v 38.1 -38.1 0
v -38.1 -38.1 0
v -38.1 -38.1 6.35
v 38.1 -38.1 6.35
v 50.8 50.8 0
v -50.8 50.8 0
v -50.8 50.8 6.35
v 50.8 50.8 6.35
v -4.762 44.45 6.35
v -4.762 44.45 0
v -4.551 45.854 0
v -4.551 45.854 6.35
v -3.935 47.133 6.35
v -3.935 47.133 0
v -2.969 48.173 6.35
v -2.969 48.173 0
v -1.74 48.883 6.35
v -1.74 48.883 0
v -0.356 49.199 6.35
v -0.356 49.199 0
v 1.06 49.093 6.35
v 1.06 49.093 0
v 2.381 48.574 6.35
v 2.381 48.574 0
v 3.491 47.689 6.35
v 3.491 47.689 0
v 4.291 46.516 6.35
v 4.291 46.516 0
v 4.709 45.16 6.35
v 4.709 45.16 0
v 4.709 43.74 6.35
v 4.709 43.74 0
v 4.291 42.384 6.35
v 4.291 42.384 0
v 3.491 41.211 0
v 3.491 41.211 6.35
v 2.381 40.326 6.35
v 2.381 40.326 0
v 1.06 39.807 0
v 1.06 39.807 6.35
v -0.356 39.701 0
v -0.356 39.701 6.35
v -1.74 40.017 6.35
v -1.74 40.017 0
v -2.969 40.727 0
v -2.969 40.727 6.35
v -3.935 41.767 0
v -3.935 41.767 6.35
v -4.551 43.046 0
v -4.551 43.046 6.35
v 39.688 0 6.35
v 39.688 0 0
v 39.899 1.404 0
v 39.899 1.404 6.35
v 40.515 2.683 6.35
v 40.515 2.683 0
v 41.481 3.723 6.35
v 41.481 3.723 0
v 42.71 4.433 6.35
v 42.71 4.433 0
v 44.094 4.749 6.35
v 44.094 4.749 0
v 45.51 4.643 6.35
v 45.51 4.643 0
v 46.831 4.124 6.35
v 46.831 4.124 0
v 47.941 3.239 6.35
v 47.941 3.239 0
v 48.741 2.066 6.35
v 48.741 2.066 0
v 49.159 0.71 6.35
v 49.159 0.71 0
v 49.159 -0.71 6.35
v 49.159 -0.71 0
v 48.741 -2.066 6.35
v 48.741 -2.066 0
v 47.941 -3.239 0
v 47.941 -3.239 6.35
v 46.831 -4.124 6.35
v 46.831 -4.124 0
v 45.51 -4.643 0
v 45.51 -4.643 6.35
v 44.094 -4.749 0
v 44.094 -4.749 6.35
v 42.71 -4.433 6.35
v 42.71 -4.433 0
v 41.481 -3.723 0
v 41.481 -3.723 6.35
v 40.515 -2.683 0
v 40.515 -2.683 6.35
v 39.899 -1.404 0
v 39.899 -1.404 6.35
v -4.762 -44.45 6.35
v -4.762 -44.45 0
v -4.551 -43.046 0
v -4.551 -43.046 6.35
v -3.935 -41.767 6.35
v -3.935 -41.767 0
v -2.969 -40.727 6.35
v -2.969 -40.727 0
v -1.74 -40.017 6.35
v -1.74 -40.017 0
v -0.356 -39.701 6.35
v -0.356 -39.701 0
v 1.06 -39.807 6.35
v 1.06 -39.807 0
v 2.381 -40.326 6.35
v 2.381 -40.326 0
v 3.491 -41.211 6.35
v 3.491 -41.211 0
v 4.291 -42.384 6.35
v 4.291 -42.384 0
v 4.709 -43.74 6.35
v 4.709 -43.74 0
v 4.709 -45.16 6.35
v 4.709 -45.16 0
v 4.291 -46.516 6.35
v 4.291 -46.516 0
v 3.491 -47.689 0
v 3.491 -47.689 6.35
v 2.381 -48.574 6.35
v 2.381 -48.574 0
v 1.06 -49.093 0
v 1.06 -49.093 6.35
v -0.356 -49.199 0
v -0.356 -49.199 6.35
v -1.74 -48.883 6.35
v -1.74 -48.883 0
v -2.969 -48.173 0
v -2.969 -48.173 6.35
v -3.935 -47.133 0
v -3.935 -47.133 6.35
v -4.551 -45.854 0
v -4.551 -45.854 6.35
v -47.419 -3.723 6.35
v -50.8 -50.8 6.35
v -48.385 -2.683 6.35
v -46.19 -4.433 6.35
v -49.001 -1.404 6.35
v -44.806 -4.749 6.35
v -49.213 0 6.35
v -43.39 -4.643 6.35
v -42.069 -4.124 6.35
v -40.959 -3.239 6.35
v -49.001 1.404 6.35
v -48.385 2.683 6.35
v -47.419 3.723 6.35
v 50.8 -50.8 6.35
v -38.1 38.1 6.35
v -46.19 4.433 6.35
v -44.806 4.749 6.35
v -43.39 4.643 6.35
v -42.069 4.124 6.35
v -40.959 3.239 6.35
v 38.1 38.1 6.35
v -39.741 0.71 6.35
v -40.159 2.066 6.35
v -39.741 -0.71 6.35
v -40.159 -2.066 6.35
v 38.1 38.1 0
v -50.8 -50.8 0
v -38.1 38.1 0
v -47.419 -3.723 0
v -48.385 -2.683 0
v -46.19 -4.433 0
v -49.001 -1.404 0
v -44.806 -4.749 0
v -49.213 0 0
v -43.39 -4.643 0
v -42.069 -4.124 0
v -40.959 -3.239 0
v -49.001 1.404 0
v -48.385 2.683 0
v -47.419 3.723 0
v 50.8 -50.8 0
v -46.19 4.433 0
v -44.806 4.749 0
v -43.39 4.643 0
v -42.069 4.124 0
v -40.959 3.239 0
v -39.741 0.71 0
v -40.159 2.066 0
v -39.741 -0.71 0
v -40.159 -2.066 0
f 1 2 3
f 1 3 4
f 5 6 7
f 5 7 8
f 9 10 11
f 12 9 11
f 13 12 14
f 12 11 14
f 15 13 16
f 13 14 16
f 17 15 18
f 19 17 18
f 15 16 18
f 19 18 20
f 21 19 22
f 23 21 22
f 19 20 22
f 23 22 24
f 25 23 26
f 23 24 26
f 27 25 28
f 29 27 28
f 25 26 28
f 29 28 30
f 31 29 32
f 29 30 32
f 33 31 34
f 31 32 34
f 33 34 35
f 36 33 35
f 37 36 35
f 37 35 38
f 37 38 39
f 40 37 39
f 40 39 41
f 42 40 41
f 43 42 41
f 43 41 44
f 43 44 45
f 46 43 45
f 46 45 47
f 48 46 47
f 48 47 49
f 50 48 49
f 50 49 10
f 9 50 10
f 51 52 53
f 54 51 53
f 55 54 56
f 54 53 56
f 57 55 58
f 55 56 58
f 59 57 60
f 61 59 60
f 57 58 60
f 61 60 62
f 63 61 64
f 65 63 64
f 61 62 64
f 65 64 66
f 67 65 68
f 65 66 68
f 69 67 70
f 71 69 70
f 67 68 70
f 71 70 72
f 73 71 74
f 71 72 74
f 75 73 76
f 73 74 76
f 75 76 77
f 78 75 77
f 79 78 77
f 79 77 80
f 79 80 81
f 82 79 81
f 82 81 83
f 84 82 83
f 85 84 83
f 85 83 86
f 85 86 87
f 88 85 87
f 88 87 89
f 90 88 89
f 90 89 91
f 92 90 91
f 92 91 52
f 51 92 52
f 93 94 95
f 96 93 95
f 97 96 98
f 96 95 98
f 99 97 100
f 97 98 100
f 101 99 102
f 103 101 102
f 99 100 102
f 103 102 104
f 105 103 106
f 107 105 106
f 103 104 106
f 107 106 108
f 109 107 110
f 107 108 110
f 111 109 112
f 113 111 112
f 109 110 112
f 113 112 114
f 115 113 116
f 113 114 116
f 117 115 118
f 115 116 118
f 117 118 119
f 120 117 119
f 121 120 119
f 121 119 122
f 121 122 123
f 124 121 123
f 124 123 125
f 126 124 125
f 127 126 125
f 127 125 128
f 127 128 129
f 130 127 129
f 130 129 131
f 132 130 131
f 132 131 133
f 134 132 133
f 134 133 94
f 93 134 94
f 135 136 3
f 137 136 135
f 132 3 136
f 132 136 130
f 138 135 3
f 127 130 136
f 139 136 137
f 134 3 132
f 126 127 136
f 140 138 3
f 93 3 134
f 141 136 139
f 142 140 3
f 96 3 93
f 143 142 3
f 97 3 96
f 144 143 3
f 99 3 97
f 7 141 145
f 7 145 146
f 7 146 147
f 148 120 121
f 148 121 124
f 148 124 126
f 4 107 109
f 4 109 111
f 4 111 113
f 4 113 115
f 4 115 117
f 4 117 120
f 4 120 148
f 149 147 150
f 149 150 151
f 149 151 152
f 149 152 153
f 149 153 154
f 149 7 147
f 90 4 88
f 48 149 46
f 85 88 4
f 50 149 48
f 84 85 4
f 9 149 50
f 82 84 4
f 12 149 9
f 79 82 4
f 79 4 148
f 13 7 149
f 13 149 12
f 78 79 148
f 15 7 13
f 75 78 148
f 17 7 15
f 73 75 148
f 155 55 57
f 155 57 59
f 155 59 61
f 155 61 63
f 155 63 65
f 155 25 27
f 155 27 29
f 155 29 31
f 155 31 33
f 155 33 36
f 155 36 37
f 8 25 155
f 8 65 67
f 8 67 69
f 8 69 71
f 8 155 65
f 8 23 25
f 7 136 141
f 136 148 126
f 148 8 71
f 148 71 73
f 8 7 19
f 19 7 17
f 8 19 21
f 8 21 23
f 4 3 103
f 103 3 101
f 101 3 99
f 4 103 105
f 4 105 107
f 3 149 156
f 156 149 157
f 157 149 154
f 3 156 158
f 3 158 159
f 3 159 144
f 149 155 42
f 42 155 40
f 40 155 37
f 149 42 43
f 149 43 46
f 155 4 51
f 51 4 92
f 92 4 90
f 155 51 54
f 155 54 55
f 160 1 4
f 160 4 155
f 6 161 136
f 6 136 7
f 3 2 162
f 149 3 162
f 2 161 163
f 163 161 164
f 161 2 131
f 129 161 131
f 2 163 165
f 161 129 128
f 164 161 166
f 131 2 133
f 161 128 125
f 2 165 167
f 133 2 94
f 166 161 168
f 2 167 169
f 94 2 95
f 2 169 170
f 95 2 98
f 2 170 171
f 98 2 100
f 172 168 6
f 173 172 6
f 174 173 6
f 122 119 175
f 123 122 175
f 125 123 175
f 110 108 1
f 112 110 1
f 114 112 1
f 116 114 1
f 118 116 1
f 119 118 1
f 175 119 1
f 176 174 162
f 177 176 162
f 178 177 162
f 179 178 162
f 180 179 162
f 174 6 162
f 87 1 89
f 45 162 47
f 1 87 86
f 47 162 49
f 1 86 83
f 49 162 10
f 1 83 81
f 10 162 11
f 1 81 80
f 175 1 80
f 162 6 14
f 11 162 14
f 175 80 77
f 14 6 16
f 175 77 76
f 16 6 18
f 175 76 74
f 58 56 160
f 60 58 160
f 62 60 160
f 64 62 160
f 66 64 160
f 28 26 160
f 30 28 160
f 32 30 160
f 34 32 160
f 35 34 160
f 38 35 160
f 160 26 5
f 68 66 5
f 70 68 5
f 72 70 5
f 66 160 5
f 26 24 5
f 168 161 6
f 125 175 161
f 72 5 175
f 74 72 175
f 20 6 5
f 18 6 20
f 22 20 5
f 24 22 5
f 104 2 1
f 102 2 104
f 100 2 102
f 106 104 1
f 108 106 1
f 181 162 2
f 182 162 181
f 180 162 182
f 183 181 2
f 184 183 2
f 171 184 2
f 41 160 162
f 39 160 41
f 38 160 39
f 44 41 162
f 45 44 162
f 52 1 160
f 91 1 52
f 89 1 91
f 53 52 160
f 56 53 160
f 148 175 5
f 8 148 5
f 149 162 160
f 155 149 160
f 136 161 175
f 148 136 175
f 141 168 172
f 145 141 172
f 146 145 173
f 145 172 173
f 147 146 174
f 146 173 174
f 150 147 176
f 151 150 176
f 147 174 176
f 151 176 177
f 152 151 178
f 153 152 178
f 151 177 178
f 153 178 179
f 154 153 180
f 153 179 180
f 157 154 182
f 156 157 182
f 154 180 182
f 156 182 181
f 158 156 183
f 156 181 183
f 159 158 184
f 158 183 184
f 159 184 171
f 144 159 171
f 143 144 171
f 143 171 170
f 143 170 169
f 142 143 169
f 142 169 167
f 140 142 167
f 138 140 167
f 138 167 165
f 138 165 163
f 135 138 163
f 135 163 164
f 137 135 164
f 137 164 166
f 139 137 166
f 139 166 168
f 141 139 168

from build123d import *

# Parameters (mm, degrees)
F0_W     = 101.6
F0_H     = 101.6
F0_W_2   = 76.2
F0_H_2   = 76.2
F1_DEPTH = 6.35
F3_D     = 9.525
F3_DEPTH = 12.7


with BuildPart() as f1:
    # F0 (on Top) → F1 (new body)
    with BuildSketch(Plane.XY):
        Rectangle(F0_W, F0_H)
        Rectangle(F0_W_2, F0_H_2, mode=Mode.SUBTRACT)
    extrude(amount=F1_DEPTH)

    # F3
    with Locations(Plane.XY.offset(6.35)):
        with Locations((0, 44.45), (-44.45, 0), (44.45, 0), (0, -44.45)):
            Hole(F3_D / 2, depth=F3_DEPTH)


solid = f1.part
